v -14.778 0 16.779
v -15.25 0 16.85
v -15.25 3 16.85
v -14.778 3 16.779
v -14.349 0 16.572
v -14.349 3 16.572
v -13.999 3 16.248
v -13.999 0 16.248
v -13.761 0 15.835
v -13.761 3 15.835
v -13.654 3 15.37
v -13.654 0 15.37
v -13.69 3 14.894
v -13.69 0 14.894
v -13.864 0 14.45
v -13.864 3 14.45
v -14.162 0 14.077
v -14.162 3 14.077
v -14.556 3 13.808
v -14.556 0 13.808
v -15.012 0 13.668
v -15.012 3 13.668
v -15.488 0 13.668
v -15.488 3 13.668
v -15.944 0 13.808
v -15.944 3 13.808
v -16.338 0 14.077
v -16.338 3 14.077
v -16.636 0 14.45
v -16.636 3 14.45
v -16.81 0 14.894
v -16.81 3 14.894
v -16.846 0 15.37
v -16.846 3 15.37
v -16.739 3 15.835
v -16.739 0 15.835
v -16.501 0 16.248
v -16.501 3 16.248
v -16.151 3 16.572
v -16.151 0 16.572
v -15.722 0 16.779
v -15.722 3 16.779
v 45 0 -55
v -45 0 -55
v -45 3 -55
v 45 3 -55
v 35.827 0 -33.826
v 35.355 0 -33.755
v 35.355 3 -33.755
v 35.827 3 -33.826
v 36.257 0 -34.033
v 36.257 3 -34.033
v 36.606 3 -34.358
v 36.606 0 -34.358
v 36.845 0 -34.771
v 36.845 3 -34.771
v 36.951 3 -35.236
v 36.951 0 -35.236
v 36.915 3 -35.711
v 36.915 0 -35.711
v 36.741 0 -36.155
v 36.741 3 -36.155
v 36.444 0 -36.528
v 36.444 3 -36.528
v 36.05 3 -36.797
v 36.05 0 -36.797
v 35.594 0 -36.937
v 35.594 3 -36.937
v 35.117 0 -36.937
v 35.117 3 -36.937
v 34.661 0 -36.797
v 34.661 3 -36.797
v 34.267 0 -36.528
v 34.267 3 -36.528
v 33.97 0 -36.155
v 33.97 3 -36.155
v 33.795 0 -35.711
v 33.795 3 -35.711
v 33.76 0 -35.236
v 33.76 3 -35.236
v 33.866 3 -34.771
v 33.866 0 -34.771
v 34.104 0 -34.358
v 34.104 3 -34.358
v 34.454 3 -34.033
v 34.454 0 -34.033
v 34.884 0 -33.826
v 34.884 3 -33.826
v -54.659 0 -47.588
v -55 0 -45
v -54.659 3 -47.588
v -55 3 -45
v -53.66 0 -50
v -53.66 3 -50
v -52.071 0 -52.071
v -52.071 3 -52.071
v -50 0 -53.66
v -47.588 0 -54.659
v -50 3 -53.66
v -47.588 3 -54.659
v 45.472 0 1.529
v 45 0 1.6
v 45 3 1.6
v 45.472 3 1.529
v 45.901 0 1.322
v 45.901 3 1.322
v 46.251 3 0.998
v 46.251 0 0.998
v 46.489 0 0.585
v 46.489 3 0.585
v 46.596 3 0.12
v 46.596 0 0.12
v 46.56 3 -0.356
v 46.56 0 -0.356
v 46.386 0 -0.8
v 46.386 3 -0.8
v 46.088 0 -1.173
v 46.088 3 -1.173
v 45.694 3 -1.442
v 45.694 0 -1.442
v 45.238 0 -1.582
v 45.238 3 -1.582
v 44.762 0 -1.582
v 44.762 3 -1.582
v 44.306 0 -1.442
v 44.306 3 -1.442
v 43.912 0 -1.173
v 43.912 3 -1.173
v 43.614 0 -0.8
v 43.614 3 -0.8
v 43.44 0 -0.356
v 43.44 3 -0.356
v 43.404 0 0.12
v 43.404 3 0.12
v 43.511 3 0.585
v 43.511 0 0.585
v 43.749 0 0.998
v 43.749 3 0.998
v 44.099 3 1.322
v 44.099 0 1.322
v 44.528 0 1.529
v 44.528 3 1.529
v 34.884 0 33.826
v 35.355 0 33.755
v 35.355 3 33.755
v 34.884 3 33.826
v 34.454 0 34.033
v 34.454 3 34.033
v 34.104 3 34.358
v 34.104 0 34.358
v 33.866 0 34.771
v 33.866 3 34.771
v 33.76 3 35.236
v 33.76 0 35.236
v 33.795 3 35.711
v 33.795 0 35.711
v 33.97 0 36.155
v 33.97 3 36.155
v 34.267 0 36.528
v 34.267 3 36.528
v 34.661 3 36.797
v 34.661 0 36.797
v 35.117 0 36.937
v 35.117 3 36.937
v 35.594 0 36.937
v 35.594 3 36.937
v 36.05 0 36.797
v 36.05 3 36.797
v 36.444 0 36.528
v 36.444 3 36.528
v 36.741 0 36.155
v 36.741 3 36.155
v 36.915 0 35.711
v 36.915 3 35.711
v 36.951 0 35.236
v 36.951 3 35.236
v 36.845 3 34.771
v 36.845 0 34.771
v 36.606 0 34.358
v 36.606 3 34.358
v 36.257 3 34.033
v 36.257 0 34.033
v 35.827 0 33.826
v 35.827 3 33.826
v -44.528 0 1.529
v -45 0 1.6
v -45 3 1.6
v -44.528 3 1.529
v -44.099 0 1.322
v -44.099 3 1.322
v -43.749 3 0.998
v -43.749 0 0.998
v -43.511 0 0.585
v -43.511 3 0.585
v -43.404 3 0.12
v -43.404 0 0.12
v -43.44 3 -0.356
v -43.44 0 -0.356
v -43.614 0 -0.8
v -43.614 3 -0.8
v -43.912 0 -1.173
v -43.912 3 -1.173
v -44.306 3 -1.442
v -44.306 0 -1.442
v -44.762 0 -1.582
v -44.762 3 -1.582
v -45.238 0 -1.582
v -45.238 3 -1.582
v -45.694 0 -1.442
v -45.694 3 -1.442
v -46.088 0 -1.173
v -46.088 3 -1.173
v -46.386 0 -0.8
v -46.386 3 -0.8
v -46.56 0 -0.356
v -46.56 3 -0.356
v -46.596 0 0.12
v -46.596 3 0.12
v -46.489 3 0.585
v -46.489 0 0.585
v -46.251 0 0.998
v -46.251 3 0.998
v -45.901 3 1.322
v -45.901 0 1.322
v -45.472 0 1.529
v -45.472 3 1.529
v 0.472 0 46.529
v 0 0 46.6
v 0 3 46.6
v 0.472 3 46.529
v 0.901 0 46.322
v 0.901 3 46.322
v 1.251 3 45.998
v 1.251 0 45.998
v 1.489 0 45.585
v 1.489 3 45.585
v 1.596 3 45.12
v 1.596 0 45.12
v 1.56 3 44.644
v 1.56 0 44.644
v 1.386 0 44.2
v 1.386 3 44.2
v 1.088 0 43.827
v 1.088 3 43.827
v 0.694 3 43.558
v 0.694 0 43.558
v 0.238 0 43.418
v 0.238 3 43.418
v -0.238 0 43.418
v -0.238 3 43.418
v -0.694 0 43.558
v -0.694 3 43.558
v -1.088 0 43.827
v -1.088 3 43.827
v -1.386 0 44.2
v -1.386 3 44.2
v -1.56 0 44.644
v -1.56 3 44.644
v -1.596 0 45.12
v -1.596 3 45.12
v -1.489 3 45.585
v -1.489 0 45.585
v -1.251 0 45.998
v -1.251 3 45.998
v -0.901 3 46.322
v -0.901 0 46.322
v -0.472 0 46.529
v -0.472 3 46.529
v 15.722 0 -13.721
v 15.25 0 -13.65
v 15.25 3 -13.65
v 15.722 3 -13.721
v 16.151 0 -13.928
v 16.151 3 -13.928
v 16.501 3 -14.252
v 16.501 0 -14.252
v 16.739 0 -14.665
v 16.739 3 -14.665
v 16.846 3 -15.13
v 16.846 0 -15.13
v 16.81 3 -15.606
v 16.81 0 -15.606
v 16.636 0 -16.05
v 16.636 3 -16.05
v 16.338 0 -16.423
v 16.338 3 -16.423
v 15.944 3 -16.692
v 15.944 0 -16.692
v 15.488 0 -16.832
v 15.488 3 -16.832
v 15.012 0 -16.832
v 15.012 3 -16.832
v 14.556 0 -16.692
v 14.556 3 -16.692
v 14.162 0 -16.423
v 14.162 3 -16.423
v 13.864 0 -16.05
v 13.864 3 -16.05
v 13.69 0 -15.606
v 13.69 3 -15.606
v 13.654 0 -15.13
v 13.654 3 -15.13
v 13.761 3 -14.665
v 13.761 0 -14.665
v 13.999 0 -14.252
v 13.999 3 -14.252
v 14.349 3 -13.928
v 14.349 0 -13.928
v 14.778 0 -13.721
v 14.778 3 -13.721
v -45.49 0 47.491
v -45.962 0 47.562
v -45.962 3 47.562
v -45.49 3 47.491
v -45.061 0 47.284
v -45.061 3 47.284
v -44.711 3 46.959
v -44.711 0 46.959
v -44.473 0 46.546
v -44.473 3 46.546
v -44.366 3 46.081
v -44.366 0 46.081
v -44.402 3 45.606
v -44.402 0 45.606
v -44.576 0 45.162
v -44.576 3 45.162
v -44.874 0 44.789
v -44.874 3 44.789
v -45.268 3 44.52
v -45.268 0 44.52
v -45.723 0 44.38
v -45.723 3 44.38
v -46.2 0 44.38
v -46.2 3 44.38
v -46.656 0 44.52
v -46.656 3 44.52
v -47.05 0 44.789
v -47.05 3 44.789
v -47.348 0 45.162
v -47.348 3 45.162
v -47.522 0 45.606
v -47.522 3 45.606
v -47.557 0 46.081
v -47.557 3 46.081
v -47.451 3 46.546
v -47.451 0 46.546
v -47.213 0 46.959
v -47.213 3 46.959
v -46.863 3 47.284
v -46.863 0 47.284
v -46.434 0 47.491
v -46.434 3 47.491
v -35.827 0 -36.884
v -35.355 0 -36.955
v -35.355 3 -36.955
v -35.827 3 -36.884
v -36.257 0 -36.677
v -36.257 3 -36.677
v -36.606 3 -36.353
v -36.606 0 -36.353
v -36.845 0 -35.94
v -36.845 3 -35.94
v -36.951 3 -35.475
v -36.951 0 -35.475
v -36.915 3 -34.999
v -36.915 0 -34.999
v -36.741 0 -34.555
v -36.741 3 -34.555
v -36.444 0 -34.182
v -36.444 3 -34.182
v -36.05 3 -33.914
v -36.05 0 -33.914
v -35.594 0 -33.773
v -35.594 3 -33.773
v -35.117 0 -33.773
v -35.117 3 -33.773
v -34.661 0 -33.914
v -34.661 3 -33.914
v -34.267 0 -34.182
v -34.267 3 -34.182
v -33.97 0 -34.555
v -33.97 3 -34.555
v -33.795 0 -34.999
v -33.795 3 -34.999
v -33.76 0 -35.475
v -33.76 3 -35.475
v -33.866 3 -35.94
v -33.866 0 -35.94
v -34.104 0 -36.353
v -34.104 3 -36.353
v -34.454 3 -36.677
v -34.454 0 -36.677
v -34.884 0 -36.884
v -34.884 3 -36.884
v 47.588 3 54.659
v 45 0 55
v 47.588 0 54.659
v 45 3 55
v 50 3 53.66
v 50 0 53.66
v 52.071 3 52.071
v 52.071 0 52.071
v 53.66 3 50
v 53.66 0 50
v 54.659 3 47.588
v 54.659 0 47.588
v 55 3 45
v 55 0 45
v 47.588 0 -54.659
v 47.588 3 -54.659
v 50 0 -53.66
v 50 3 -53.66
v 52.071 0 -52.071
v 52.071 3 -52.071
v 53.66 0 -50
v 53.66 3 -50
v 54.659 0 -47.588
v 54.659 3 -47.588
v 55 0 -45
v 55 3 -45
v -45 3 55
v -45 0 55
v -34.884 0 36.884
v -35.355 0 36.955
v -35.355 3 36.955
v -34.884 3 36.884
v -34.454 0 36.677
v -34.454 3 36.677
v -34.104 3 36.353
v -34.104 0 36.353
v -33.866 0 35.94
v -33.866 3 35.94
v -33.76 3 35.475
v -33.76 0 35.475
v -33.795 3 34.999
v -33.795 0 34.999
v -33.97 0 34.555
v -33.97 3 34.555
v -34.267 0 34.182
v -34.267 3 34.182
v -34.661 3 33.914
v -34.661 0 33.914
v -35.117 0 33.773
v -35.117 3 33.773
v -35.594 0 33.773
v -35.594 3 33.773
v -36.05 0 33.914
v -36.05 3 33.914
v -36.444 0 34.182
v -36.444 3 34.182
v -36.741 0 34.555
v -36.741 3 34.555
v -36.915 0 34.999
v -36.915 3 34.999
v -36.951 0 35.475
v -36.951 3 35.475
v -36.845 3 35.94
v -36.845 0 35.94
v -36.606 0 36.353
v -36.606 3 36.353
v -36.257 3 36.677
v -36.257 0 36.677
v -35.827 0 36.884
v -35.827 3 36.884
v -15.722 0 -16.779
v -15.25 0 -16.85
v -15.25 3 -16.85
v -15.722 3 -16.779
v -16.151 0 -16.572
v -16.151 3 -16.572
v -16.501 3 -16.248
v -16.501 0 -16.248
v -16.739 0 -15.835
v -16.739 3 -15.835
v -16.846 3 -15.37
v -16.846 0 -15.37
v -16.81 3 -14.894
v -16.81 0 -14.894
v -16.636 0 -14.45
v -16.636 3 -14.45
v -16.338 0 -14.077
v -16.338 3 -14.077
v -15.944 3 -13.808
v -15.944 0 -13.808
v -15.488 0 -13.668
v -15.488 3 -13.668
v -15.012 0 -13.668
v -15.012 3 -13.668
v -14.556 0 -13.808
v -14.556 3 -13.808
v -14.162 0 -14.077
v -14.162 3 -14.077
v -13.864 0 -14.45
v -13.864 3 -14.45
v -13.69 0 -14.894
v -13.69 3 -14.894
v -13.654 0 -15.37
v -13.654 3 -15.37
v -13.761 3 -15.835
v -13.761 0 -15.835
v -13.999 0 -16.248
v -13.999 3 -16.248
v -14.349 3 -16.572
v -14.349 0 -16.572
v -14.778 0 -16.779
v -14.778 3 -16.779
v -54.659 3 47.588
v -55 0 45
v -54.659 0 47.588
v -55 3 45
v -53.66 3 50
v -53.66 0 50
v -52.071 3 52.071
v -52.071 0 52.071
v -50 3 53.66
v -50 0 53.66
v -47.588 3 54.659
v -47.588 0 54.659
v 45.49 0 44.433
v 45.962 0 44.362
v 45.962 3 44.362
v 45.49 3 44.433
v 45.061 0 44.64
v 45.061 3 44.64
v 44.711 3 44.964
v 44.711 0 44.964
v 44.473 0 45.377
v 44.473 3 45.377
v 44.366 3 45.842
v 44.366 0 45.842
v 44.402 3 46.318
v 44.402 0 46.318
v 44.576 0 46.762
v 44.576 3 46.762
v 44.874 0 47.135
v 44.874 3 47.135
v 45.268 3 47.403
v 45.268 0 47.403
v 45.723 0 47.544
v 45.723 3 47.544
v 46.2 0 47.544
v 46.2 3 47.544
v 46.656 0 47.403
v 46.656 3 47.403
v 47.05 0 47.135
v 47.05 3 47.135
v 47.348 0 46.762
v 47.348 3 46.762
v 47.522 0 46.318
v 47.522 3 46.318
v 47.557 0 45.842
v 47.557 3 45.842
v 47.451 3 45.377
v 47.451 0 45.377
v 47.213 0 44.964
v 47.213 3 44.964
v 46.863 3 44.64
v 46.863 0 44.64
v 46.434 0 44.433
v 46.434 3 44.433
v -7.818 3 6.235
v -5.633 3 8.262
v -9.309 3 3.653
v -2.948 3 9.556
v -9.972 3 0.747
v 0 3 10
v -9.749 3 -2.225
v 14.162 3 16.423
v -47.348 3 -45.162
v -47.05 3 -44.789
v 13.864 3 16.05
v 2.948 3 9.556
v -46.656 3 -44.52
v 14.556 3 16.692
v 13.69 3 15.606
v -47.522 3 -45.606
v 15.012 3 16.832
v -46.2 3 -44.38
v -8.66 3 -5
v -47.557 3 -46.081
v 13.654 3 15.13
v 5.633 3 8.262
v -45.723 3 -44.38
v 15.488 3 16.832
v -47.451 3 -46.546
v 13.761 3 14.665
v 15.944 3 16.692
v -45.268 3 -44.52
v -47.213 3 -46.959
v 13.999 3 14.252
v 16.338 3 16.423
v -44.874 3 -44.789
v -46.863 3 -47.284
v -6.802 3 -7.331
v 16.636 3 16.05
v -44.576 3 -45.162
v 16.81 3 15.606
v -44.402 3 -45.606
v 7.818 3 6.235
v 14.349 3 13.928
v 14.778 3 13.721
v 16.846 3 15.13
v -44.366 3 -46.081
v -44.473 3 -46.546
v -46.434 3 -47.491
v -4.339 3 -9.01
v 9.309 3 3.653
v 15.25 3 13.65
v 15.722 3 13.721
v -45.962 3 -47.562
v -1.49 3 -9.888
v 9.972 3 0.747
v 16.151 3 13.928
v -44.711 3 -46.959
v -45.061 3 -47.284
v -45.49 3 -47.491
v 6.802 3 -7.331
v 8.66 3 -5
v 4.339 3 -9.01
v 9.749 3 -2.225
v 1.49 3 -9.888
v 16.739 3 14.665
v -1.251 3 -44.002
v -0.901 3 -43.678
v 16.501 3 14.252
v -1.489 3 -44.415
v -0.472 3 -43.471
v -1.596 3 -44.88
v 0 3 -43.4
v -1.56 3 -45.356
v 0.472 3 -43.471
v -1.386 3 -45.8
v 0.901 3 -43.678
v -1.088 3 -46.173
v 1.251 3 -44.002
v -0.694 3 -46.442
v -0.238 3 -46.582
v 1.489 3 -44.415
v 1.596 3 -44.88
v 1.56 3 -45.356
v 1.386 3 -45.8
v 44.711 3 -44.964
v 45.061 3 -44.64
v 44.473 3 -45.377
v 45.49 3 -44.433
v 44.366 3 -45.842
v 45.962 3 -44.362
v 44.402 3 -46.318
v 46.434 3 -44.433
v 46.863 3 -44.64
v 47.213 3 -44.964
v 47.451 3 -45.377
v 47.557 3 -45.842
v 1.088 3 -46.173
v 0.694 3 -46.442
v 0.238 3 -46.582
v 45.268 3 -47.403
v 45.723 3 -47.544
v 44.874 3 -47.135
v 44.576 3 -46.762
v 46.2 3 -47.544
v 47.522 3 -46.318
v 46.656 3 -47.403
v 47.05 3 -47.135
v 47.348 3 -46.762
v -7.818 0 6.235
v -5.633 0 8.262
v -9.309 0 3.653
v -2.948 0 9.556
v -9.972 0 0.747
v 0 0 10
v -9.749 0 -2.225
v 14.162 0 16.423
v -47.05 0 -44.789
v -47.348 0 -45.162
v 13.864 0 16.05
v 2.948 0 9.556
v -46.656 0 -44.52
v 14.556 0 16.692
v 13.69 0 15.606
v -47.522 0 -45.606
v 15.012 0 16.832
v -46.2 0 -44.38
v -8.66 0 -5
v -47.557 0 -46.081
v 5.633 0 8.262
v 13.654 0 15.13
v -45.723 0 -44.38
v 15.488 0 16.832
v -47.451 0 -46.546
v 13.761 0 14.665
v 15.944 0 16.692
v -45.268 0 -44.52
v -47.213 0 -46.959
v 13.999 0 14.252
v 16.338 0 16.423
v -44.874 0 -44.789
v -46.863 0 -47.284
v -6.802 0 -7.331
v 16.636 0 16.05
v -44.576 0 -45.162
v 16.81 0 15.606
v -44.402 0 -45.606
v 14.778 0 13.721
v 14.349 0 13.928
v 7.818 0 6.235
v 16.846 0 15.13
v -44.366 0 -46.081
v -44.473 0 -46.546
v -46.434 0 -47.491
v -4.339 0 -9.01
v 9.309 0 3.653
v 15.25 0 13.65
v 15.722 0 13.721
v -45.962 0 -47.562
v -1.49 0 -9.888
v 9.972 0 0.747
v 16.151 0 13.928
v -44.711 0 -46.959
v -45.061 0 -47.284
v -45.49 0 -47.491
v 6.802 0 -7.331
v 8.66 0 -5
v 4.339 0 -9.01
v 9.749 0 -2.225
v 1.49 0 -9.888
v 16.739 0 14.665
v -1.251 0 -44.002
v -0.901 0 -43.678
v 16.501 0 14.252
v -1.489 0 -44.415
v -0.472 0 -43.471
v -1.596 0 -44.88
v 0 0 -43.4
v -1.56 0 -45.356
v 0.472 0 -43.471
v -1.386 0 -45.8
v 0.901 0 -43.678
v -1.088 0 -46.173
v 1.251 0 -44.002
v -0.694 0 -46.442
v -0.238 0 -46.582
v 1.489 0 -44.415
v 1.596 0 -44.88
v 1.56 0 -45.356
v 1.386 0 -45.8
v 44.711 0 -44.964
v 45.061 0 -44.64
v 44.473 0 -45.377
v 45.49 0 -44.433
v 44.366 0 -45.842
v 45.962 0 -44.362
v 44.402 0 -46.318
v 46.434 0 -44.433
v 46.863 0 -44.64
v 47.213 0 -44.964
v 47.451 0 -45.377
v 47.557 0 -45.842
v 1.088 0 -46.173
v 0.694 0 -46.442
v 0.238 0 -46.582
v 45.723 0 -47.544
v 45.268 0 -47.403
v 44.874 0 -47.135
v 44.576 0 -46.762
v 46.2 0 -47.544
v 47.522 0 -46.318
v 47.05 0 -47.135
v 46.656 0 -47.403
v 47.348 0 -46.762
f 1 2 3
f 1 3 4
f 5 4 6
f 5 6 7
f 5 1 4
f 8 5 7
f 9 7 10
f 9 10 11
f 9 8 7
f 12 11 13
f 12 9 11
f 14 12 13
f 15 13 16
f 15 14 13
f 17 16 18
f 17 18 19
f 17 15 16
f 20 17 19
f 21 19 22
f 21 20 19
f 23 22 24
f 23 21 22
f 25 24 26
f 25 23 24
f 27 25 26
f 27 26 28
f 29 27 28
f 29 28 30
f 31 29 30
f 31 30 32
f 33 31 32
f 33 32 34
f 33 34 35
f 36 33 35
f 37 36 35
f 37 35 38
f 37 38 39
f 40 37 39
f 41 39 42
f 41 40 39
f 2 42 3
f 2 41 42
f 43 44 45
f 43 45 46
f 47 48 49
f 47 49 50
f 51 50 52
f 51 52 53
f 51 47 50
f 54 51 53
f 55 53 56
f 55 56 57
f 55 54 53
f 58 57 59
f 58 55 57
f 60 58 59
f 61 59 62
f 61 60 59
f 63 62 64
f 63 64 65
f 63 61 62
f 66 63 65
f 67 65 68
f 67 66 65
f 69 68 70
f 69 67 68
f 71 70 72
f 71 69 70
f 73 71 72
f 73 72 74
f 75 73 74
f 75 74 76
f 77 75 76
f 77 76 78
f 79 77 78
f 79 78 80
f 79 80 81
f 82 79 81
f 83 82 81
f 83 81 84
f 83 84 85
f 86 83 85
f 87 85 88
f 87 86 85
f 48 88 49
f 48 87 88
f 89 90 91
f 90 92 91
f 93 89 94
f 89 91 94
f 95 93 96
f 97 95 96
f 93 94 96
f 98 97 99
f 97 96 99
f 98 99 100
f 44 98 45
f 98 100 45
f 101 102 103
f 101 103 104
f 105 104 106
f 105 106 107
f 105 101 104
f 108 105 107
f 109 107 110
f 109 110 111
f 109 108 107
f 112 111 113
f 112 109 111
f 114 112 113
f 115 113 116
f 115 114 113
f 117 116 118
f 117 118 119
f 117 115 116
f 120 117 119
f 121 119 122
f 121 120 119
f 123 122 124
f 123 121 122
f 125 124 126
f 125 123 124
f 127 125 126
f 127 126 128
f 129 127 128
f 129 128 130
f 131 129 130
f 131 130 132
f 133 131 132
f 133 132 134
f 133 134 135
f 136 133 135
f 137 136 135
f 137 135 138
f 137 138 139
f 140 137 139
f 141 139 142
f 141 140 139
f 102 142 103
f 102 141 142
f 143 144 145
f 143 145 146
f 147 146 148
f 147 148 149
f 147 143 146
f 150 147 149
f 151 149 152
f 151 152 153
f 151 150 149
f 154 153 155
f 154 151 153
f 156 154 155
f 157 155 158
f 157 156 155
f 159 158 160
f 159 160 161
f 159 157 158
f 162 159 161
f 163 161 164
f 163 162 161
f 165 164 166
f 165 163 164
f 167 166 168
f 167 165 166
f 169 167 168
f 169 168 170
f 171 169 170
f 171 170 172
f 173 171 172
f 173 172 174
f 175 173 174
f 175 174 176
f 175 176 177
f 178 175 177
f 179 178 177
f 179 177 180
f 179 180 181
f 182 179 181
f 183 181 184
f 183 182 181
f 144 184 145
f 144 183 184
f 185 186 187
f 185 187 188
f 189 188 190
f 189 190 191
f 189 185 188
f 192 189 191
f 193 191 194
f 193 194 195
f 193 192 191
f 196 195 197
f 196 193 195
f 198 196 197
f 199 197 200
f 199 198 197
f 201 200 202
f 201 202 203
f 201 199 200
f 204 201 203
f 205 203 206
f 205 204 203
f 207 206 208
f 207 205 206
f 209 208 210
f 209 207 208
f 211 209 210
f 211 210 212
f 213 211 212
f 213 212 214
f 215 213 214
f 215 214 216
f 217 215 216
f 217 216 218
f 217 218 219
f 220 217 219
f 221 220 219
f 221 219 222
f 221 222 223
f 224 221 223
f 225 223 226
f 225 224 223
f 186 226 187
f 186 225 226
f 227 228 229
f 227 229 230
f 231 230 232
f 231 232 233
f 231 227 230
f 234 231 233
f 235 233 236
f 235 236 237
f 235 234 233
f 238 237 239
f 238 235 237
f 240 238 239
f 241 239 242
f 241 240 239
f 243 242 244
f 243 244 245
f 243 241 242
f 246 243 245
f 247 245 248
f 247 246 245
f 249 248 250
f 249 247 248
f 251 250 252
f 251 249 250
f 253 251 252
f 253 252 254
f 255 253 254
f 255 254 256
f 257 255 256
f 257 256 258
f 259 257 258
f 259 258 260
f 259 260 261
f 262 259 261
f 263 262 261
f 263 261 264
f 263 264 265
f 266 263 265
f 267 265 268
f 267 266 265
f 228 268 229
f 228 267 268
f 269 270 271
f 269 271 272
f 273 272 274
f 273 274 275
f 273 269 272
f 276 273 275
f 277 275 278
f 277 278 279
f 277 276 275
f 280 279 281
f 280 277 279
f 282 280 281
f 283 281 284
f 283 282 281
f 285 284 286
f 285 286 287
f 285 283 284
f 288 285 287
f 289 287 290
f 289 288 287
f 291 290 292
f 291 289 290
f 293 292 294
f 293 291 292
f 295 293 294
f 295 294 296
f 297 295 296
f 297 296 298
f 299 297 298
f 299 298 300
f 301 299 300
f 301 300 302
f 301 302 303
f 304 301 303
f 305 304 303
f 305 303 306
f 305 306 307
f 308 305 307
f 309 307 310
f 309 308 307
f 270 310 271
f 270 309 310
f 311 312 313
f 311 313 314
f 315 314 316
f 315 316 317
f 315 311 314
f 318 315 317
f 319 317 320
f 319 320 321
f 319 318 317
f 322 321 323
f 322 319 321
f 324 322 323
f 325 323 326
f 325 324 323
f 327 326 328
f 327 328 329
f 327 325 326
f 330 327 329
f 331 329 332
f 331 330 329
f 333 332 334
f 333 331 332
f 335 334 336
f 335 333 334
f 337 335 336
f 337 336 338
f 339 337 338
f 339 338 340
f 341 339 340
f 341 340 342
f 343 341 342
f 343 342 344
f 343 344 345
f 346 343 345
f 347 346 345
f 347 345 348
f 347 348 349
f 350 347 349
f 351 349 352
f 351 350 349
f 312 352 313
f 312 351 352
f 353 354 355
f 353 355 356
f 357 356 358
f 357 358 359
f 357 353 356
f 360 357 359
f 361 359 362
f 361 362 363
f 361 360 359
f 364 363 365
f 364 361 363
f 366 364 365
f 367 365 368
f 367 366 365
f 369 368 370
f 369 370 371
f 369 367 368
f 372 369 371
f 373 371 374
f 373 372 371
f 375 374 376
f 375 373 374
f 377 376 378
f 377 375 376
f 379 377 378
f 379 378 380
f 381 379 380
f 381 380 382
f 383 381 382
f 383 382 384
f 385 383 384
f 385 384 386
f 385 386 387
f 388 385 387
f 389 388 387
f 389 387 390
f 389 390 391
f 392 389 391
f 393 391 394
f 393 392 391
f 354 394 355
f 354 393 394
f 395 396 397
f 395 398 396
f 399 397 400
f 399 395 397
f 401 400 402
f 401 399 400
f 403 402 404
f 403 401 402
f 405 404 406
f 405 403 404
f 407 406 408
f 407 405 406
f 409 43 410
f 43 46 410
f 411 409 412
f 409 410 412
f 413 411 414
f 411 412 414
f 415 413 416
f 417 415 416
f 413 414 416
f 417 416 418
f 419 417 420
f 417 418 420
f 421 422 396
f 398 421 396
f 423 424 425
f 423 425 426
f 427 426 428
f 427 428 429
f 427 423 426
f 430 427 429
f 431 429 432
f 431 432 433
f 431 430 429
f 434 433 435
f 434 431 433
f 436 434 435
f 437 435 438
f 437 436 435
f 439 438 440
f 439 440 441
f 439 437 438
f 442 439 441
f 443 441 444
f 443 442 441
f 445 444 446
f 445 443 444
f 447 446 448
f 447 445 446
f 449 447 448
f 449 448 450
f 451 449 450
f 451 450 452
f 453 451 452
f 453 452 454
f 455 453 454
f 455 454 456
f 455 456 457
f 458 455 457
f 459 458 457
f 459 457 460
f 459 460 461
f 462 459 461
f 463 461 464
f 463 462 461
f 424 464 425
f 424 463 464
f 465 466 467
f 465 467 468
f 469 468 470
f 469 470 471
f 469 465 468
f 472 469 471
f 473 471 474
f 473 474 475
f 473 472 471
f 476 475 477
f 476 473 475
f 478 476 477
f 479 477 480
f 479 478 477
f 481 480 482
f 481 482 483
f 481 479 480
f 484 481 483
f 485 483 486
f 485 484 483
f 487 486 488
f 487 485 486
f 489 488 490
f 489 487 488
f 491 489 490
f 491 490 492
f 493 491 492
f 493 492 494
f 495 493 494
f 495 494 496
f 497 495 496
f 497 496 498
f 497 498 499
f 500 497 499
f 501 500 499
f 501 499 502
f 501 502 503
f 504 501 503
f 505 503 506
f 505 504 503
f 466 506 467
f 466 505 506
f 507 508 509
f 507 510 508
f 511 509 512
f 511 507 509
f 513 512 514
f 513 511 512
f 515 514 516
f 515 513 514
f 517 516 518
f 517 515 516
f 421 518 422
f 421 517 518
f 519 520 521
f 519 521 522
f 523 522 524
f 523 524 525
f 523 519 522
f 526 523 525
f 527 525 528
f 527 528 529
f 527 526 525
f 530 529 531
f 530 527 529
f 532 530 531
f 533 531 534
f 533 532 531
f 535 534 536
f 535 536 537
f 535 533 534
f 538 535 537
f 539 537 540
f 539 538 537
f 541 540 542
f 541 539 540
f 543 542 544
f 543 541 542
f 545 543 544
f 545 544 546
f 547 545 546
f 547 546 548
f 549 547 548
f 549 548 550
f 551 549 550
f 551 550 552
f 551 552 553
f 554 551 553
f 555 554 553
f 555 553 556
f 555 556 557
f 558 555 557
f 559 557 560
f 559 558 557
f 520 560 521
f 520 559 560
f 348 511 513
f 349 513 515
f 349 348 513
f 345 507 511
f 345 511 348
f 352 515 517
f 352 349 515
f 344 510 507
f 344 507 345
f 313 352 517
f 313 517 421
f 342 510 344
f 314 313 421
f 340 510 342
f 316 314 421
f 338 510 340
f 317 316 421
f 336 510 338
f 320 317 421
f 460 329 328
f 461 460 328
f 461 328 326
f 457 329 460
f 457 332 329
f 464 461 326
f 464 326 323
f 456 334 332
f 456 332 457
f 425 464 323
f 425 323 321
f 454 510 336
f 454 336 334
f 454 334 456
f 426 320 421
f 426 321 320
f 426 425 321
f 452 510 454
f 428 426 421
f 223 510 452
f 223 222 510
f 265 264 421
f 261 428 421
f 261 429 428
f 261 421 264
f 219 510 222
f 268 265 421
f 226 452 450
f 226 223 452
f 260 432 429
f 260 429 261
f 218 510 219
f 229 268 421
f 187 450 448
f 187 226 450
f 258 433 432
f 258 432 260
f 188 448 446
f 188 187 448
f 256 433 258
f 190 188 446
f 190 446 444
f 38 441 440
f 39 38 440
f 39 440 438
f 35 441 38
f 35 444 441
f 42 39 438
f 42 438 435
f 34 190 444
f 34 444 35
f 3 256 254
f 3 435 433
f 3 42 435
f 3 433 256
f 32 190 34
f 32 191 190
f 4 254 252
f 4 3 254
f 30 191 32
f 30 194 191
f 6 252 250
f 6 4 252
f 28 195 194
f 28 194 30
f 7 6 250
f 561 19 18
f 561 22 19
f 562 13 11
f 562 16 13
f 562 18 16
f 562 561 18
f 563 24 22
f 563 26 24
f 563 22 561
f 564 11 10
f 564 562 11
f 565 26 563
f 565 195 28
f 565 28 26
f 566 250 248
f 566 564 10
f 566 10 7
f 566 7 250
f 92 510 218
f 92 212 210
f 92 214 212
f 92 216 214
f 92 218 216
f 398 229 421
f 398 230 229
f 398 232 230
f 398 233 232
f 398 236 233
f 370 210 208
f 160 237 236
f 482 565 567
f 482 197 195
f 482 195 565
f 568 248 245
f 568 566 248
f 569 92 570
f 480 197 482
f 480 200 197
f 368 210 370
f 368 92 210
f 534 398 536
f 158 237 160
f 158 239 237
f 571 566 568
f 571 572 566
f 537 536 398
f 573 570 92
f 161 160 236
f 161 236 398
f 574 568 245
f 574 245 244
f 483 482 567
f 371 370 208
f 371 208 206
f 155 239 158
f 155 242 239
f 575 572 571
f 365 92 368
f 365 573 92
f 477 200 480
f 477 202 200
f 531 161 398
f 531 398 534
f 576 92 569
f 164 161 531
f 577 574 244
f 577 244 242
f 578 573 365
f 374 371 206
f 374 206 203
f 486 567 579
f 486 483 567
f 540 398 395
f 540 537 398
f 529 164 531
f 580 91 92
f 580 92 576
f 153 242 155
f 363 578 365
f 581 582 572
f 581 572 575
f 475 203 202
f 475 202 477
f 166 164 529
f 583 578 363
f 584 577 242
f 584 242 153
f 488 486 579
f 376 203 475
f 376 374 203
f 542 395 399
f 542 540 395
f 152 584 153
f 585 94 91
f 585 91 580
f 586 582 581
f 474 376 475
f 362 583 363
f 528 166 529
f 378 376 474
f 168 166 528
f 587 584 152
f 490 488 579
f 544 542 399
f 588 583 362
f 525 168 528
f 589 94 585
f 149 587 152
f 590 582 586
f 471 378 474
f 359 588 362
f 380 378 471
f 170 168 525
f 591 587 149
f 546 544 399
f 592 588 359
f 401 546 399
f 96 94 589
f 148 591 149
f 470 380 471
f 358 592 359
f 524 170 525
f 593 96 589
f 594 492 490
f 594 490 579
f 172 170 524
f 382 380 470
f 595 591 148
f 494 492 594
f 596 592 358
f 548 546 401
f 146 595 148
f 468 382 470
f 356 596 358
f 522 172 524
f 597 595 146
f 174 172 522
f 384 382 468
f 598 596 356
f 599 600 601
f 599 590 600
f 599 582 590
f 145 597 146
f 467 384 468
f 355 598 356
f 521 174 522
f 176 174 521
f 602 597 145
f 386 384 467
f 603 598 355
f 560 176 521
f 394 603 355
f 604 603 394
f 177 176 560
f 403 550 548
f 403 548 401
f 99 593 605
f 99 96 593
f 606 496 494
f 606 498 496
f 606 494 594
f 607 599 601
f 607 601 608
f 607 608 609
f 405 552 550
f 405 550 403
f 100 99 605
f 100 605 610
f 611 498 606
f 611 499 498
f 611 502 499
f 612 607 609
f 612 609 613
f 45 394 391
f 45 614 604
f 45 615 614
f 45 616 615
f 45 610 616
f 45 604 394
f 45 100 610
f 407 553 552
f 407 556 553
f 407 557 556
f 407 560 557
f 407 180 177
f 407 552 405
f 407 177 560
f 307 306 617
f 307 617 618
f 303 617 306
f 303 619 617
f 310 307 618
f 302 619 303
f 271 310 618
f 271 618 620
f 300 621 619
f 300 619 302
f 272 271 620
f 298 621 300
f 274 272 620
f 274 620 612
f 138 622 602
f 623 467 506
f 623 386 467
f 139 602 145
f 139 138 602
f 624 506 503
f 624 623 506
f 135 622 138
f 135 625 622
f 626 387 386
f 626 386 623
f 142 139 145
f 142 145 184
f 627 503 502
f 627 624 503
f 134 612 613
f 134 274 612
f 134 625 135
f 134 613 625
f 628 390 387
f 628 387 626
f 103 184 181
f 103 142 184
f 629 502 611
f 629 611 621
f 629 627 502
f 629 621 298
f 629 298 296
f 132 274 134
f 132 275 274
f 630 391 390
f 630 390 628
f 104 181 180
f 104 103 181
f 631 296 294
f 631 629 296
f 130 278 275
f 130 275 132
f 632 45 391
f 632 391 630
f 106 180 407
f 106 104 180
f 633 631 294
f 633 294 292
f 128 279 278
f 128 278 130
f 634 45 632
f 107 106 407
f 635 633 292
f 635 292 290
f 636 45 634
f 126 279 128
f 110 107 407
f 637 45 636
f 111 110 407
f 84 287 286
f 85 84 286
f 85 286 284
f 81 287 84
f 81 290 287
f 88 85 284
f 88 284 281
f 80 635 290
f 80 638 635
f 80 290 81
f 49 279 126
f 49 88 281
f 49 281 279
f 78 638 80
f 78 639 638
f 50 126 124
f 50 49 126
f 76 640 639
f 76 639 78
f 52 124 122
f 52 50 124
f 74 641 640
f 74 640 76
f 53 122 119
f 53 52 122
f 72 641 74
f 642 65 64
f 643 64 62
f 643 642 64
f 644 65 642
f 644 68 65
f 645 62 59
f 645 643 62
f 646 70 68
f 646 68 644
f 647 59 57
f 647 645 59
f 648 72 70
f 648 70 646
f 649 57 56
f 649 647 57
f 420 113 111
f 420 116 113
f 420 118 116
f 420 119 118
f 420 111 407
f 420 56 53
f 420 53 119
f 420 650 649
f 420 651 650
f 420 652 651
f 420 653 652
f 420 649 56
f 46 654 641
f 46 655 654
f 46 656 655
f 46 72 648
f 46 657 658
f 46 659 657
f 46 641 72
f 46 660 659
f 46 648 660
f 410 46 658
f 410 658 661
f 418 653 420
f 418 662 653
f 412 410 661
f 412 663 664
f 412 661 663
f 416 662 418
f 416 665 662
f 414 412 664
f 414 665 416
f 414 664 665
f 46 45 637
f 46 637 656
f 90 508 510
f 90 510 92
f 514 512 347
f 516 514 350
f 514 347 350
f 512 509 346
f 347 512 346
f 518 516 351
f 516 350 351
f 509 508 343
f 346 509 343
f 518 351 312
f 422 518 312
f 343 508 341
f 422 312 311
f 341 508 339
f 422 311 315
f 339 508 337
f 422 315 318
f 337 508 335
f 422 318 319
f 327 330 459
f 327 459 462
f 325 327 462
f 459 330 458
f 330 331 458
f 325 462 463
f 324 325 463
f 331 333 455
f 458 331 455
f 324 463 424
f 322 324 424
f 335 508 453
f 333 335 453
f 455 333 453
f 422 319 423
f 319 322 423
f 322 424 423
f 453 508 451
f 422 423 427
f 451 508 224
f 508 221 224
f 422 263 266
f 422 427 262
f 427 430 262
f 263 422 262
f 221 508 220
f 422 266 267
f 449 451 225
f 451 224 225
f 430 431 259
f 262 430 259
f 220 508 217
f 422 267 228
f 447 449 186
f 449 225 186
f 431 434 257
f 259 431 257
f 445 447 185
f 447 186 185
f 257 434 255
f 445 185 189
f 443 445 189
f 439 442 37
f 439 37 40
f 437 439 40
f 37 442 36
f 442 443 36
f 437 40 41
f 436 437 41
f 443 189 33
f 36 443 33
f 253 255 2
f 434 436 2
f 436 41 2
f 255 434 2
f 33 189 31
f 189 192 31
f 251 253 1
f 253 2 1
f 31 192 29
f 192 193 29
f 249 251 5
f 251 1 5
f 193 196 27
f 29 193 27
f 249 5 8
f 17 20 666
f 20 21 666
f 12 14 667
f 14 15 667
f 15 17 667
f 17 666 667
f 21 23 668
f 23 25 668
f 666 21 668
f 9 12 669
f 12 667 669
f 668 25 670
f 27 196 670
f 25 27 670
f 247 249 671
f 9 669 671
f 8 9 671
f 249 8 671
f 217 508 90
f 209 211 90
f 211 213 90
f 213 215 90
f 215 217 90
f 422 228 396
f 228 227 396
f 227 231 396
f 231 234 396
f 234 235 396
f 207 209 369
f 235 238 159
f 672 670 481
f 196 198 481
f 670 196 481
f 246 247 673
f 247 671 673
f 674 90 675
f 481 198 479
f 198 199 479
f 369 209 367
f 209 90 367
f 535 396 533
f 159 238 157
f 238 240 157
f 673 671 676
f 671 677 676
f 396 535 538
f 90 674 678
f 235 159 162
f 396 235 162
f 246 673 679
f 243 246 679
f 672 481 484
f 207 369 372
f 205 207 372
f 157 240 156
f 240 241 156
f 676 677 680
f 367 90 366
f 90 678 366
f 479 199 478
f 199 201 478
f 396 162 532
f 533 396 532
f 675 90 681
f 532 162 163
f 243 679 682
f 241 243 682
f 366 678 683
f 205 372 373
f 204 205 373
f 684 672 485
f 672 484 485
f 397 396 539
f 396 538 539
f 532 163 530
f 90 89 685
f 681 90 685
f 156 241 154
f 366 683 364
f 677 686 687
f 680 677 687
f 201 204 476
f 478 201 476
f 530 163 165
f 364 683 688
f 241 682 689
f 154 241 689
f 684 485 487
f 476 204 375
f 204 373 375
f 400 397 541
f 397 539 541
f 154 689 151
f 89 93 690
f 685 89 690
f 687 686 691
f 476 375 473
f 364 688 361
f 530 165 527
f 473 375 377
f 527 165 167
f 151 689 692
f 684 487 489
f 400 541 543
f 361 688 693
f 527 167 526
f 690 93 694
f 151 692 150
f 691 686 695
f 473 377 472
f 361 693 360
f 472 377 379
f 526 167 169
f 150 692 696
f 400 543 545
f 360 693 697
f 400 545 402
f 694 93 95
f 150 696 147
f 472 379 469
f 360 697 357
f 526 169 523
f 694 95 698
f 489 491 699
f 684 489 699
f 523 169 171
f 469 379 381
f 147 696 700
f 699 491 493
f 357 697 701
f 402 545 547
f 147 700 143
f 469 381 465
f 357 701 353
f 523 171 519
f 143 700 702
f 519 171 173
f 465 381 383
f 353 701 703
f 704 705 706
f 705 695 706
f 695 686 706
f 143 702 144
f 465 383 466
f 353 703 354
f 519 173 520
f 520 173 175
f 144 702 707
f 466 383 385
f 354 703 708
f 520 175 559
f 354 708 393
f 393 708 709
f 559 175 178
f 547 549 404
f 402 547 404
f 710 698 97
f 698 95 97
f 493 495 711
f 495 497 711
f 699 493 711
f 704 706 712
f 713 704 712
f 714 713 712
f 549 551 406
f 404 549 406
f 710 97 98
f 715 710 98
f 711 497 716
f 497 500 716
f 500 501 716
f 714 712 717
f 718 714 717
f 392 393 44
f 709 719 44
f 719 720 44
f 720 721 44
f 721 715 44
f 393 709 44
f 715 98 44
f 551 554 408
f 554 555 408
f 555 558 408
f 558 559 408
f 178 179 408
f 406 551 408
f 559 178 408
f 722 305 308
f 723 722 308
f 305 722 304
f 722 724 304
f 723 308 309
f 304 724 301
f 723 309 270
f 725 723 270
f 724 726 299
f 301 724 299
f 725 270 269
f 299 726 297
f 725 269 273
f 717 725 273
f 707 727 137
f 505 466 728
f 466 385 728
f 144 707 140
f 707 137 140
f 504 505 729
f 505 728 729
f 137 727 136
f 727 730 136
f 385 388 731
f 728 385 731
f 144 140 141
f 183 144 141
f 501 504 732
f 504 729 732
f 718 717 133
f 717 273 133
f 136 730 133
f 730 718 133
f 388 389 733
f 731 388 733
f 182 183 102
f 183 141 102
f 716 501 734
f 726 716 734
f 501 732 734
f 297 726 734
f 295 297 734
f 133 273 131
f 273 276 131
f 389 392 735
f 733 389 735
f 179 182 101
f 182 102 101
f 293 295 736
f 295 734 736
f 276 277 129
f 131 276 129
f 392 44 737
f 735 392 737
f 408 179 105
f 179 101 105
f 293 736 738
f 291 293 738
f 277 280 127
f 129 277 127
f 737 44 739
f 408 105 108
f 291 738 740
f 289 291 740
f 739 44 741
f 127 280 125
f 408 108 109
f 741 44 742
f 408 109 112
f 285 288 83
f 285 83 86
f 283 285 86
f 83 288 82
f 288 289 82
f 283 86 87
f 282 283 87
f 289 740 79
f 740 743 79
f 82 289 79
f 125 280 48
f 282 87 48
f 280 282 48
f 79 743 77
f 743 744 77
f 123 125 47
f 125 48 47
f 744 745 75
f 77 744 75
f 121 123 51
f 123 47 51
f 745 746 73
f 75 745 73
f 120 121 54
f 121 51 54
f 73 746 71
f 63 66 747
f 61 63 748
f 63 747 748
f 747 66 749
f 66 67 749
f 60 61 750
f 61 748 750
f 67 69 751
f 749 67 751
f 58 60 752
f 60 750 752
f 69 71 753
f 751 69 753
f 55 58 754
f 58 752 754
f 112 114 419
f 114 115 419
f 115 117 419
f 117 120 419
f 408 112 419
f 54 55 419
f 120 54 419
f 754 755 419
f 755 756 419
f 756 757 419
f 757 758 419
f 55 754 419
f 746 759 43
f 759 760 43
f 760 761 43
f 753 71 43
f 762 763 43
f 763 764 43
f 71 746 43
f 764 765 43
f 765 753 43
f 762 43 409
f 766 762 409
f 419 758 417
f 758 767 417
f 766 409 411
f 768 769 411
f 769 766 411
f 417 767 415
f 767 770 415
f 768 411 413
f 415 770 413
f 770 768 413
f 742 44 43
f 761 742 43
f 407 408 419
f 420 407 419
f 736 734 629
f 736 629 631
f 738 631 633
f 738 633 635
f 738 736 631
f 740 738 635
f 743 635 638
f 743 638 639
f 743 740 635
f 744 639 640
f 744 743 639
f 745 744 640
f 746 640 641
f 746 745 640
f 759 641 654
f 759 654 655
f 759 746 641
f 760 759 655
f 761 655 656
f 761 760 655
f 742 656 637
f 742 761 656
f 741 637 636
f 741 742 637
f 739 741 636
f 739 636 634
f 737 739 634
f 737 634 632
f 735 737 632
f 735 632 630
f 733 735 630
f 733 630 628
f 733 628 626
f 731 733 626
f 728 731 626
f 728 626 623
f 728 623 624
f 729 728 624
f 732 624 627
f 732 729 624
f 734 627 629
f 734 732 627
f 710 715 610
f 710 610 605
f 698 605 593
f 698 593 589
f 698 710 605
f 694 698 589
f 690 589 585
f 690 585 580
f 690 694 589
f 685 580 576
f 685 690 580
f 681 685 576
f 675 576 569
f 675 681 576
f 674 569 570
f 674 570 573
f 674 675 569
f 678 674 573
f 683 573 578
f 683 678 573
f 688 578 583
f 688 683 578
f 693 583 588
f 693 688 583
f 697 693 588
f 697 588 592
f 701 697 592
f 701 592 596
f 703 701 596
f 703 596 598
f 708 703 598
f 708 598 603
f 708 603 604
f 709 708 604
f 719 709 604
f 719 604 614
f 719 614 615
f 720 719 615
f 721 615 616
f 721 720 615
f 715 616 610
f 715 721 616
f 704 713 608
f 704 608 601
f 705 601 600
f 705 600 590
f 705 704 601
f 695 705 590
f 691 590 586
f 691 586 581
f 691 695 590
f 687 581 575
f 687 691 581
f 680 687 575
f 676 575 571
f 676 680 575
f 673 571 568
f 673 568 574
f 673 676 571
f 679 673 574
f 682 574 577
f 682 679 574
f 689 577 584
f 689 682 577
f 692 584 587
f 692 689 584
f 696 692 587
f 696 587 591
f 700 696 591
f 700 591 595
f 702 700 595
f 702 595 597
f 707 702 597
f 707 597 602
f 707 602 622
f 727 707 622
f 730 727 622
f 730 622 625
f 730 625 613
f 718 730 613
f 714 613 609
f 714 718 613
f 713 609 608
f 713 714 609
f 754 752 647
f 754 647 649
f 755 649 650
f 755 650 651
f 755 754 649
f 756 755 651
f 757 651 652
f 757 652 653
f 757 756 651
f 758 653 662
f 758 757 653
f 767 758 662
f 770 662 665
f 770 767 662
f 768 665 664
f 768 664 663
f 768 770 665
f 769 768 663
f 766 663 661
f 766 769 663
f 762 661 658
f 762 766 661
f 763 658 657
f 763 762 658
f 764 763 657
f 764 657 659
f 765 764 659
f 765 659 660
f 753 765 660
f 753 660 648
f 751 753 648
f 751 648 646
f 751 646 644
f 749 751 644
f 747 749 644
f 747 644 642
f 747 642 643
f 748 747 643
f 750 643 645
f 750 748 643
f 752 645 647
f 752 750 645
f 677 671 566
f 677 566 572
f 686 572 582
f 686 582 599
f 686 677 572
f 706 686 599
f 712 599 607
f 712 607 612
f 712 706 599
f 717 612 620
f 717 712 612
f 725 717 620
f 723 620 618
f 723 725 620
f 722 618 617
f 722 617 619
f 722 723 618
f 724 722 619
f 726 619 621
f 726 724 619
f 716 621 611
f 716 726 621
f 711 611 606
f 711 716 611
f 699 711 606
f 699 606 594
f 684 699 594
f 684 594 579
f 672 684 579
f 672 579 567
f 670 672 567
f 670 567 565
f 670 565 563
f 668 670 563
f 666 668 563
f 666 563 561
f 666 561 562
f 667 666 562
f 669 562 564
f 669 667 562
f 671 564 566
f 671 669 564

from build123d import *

# Parameters (mm, degrees)
SKETCH2_W           = 110
SKETCH2_H           = 110
SKETCH2_R           = 1.6
SKETCH2_R_2         = 10
BOSS_EXTRUDE1_DEPTH = 3
FILLET1_R           = 10


with BuildPart() as part:
    # Sketch2 → Boss-Extrude1 (new body)
    with BuildSketch(Plane(origin=(0, 0, 0), x_dir=(1, 0, 0), z_dir=(0, 1, 0))):
        Rectangle(SKETCH2_W, SKETCH2_H)
        with Locations(Location((15.25, 15.25, 0), (0, 0, 270))):
            Circle(SKETCH2_R, mode=Mode.SUBTRACT)
        with Locations(Location((-15.25, 15.25, 0), (0, 0, 90))):
            Circle(SKETCH2_R, mode=Mode.SUBTRACT)
        with Locations(Location((-15.25, -15.25, 0), (0, 0, 270))):
            Circle(SKETCH2_R, mode=Mode.SUBTRACT)
        with Locations(Location((15.25, -15.25, 0), (0, 0, 90))):
            Circle(SKETCH2_R, mode=Mode.SUBTRACT)
        with Locations(Location((35.3553, 35.3553, 0), (0, 0, 270))):
            Circle(SKETCH2_R, mode=Mode.SUBTRACT)
        with Locations(Location((45.9619, 45.9619, 0), (0, 0, 270))):
            Circle(SKETCH2_R, mode=Mode.SUBTRACT)
        with Locations(Location((-35.3553, 35.3553, 0), (0, 0, 90))):
            Circle(SKETCH2_R, mode=Mode.SUBTRACT)
        with Locations(Location((-45.9619, 45.9619, 0), (0, 0, 90))):
            Circle(SKETCH2_R, mode=Mode.SUBTRACT)
        with Locations(Location((45.9619, -45.9619, 0), (0, 0, 90))):
            Circle(SKETCH2_R, mode=Mode.SUBTRACT)
        with Locations(Location((35.3553, -35.3553, 0), (0, 0, 90))):
            Circle(SKETCH2_R, mode=Mode.SUBTRACT)
        with Locations(Location((-45.9619, -45.9619, 0), (0, 0, 270))):
            Circle(SKETCH2_R, mode=Mode.SUBTRACT)
        with Locations(Location((-35.3553, -35.3553, 0), (0, 0, 270))):
            Circle(SKETCH2_R, mode=Mode.SUBTRACT)
        with Locations(Location((0, 45, 0), (0, 0, 270))):
            Circle(SKETCH2_R, mode=Mode.SUBTRACT)
        with Locations(Location((0, -45, 0), (0, 0, 270))):
            Circle(SKETCH2_R, mode=Mode.SUBTRACT)
        with Locations(Location((45, 0, 0), (0, 0, 270))):
            Circle(SKETCH2_R, mode=Mode.SUBTRACT)
        with Locations(Location((-45, 0, 0), (0, 0, 270))):
            Circle(SKETCH2_R, mode=Mode.SUBTRACT)
        with Locations(Location((0, 0, 0), (0, 0, 270))):
            Circle(SKETCH2_R_2, mode=Mode.SUBTRACT)
    extrude(amount=BOSS_EXTRUDE1_DEPTH)

    # Fillet1
    fillet1_edges = [part.edges().sort_by_distance(p)[0] for p in [
        (55, 1.5, 55),
        (-55, 1.5, 55),
        (-55, 1.5, -55),
        (55, 1.5, -55),
    ]]
    fillet(fillet1_edges, radius=FILLET1_R)


solid = part.part
